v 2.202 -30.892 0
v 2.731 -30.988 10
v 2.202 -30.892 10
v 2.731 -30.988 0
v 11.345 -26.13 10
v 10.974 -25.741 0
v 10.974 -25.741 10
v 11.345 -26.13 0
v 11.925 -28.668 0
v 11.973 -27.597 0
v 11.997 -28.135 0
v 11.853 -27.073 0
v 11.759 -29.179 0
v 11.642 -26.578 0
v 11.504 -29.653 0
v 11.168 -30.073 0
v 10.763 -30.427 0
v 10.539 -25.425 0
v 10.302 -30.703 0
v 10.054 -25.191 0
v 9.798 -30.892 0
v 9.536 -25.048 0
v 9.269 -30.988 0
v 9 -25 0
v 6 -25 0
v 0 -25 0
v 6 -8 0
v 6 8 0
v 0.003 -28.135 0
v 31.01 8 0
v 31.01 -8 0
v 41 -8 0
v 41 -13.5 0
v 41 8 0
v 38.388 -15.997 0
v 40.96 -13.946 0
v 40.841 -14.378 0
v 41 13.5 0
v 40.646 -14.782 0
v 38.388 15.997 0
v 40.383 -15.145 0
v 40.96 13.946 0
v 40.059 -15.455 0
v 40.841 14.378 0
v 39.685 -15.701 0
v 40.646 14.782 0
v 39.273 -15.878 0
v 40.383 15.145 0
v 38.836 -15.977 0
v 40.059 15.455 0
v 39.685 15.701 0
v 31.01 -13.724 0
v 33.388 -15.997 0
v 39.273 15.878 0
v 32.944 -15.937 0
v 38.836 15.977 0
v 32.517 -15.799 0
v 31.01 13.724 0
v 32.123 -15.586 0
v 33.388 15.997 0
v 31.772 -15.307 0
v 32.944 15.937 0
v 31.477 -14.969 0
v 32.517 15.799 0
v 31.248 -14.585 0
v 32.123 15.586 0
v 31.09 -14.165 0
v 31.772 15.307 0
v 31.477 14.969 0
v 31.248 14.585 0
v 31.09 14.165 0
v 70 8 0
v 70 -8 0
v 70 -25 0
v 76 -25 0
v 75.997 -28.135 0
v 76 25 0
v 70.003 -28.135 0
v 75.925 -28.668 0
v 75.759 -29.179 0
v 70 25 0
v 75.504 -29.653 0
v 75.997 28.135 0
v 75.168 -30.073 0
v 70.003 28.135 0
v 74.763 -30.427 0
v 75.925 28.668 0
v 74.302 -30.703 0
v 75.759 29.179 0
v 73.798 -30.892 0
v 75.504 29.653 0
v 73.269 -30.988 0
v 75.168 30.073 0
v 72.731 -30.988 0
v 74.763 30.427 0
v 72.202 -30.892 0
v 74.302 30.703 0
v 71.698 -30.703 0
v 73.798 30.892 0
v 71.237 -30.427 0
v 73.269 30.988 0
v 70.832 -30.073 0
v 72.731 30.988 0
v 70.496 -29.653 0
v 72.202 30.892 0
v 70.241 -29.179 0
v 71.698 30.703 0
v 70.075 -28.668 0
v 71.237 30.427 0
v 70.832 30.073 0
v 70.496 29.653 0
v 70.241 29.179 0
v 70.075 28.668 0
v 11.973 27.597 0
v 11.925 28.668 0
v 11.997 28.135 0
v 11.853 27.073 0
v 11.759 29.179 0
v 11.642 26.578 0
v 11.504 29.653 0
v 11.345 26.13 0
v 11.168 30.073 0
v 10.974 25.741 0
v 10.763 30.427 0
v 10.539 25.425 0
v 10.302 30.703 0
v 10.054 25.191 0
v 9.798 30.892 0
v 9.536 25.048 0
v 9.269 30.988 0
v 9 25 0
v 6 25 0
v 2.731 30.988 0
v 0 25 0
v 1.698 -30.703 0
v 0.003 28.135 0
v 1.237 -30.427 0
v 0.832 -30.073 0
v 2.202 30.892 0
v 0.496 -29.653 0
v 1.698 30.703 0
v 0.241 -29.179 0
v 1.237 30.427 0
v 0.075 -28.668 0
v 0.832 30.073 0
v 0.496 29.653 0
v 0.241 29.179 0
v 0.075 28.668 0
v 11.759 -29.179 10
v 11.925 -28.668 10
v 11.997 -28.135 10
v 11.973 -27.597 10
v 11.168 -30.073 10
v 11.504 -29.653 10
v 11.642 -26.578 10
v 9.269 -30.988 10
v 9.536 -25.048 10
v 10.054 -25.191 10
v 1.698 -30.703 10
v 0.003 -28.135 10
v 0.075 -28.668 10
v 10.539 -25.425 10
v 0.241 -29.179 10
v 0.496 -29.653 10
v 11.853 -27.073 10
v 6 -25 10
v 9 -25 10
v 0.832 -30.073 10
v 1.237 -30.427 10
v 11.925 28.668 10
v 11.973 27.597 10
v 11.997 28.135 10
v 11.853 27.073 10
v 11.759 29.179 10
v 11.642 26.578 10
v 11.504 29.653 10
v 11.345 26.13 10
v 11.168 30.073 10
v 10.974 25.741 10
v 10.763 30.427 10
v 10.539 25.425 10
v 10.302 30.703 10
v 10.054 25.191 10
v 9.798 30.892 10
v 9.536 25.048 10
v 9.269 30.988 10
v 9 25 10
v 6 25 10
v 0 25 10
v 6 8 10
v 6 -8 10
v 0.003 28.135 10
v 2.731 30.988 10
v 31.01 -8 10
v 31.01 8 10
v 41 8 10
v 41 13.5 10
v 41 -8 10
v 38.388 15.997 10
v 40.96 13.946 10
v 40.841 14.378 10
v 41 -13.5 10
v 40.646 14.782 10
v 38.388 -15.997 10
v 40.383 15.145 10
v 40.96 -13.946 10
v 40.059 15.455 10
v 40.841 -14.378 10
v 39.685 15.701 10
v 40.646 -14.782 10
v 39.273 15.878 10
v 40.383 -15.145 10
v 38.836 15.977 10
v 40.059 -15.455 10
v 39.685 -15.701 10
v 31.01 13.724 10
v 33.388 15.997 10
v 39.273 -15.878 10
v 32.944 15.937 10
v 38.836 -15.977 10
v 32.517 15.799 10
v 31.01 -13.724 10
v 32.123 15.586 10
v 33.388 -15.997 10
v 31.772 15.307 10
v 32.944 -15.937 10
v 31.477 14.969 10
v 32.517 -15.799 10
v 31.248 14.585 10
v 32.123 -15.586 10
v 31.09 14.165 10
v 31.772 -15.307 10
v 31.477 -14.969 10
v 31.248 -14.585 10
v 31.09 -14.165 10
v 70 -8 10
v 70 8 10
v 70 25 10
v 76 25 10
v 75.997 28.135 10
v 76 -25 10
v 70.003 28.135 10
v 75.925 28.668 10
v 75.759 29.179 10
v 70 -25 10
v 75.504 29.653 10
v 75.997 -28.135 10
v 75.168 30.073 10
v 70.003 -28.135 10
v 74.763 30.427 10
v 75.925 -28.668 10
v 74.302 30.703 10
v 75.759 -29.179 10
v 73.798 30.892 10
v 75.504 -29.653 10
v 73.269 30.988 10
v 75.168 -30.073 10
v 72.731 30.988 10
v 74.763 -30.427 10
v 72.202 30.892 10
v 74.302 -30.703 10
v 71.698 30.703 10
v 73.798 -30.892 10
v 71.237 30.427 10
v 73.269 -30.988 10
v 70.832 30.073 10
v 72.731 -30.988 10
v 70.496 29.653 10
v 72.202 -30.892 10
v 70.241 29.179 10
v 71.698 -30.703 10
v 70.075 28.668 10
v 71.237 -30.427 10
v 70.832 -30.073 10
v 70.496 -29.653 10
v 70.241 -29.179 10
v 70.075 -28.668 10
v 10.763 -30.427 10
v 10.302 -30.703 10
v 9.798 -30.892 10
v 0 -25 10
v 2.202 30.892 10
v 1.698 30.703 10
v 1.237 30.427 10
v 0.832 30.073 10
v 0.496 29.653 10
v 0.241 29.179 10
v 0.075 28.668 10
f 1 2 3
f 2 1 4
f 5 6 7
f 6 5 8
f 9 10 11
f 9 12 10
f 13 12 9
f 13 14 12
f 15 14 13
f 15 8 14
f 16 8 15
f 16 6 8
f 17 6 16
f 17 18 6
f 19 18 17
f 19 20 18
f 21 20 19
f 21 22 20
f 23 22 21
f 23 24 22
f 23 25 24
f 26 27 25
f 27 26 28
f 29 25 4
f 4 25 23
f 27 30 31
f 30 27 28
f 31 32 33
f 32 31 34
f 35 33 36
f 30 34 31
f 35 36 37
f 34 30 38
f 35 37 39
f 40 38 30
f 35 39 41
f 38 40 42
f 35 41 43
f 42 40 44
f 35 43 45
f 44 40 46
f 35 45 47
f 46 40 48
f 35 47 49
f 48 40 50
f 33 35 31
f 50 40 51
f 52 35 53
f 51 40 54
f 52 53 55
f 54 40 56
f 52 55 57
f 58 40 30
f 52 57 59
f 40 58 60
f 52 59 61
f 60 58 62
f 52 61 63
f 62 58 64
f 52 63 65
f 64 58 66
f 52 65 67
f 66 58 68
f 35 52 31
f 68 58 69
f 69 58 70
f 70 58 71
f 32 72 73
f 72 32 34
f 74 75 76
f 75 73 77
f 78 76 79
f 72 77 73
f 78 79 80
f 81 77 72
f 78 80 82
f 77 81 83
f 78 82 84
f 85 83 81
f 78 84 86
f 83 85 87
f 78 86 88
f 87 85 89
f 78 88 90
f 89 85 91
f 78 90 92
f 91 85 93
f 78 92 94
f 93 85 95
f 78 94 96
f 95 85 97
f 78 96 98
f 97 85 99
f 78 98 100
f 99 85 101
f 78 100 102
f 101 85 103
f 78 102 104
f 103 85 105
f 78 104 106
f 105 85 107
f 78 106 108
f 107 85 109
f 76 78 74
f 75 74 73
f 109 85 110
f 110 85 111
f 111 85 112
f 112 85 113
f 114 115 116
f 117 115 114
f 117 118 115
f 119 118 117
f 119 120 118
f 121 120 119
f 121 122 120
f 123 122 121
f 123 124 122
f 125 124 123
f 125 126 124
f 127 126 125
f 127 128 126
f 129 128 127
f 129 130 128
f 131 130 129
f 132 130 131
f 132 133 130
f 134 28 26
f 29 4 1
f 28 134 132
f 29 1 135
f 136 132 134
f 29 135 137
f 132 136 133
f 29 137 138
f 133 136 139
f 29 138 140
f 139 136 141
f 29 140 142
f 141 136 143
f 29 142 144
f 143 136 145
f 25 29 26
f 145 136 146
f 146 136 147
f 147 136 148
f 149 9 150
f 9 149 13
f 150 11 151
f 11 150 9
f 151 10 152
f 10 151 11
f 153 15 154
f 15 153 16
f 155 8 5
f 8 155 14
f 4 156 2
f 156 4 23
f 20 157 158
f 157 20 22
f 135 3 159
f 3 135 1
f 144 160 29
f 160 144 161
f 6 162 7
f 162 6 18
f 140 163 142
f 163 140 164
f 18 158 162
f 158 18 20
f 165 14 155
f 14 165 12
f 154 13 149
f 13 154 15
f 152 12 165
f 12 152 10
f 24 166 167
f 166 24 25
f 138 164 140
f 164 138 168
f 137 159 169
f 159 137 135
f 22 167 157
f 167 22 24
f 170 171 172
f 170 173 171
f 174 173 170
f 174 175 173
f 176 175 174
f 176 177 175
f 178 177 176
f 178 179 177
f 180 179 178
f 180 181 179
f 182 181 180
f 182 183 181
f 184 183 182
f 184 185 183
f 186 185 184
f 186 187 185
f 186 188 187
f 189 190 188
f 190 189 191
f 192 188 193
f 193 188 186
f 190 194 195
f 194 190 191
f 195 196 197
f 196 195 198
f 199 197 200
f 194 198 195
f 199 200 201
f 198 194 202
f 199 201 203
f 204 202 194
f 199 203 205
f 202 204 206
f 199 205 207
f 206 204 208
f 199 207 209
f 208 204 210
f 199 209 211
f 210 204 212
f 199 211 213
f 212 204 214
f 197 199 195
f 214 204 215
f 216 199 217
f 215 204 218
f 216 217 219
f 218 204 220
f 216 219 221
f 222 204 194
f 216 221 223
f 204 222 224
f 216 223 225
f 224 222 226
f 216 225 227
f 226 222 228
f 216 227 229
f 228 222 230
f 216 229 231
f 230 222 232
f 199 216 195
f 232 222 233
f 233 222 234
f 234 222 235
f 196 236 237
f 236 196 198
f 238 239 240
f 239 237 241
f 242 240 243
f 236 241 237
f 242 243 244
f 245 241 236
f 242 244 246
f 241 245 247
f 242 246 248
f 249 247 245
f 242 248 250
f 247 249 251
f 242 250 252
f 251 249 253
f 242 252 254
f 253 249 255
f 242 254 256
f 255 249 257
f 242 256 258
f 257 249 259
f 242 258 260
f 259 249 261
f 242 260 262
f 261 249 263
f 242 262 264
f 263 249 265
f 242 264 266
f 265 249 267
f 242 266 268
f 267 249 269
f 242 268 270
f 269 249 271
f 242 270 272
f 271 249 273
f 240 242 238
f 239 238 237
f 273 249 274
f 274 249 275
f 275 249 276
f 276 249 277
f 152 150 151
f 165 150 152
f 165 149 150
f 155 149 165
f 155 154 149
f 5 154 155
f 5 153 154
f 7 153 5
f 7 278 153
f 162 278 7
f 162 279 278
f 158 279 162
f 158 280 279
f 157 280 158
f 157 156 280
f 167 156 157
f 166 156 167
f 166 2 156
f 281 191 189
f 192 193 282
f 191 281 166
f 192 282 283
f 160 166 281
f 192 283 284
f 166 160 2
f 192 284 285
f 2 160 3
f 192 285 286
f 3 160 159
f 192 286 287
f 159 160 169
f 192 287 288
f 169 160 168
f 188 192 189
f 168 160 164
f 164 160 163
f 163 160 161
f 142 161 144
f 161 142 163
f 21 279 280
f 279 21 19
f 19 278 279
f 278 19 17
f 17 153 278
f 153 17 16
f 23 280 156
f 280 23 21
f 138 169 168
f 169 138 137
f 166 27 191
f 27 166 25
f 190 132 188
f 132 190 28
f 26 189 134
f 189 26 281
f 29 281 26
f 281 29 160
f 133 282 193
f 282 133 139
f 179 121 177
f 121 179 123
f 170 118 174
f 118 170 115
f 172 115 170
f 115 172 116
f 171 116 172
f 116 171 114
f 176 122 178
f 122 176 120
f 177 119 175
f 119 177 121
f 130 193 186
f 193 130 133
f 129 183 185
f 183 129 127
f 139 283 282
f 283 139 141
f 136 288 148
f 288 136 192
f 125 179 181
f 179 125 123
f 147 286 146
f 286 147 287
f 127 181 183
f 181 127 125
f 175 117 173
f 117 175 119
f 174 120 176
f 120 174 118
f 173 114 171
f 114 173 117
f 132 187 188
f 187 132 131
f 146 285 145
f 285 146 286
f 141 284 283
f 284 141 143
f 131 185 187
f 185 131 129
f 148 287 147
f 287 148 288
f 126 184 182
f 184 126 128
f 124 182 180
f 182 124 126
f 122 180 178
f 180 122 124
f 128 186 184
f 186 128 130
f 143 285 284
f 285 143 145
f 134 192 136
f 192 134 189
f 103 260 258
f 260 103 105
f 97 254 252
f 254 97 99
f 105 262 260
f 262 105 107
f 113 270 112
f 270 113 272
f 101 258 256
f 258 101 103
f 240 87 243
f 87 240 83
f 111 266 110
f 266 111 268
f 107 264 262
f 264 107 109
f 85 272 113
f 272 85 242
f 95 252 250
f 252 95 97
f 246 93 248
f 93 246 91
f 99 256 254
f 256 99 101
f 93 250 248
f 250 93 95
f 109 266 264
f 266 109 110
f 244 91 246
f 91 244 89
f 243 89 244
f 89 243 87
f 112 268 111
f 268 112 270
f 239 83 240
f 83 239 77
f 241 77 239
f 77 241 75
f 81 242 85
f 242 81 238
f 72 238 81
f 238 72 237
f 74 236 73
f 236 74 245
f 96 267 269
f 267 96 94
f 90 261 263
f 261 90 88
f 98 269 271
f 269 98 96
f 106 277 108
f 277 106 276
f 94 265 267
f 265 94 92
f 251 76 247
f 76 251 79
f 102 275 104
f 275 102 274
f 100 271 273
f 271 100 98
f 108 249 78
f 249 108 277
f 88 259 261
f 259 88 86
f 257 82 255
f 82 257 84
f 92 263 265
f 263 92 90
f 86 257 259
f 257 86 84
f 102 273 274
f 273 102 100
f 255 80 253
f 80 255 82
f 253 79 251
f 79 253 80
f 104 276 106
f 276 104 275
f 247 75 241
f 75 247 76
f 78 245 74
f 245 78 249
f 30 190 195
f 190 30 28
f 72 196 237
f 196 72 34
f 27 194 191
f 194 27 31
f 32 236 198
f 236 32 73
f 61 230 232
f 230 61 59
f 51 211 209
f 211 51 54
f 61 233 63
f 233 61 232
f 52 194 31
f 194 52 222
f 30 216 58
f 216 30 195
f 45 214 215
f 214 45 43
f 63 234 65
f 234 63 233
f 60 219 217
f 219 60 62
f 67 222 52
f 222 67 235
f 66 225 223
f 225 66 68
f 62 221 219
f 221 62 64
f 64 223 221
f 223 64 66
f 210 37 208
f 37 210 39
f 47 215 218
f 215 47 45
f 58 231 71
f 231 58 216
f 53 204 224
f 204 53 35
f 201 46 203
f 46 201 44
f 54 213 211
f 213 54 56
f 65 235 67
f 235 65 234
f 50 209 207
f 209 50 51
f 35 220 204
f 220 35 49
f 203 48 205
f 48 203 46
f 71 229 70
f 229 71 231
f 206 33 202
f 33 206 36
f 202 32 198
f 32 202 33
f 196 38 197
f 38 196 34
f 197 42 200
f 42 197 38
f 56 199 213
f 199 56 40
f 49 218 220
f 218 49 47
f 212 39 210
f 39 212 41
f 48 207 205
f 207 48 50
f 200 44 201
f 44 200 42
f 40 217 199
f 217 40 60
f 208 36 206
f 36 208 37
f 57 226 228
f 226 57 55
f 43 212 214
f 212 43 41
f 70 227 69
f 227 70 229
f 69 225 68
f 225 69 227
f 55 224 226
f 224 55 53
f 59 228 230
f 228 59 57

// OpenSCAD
/* == Customizer Settings ================================================ */
/*[Gimbal Settings]*/

// in mm [x,y]
bridge_dimensions = [64,16];

// in mm [x,y], [0,0] if not needed
crosssection_dimensions = [10,32];

// in mm
crosssection_xoffset = -2;

// in mm, outer width (for inner width: add 2x handle_thickness if hooks are used)
handle_a_width = 62;

// in mm, 0 if not needed
handle_a_hooks = 6;

// in mm, outer width (for inner width: add 2x handle_thickness if hooks are used)
handle_b_width = 62;

// in mm, 0 if not needed
handle_b_hooks = 0;

// soft (rounded) hooks?
hooks_soft = true;

// in mm, x/y thickness of the handles
handle_thickness = 6;

// in mm, z thickness of base material
thickness = 10;

// Surface detail level
resolution = 35; //[20:Draft, 35:Normal, 50:Smooth]


/* == Render ============================================================= */
HClamp($fn=resolution);


/* == H-Clamp ============================================================ */
module HClamp() {
    union() {
        // handle a
        translate([handle_thickness+handle_a_hooks,-handle_a_width/2,0])
            rotate([0,0,90])
                UClampOSoft(handle_a_width,handle_a_hooks,handle_thickness,thickness,soft_pins=hooks_soft);
        translate([handle_thickness,0]) {
            // bridge
            translate([0,-bridge_dimensions[1]/2,0])
                cube(lvmult([1,1,thickness],bridge_dimensions));
            // bridge cross-section
            translate(-crosssection_dimensions/2 + [bridge_dimensions[0]/2 + crosssection_xoffset,0])
                SoftCubeLazy(lvmult([1,1,thickness], crosssection_dimensions), 2.5); // check radius
            // handle b
            translate([bridge_dimensions[0]-handle_b_hooks,handle_b_width/2,0])
                rotate([0,0,270])
                    UClampOSoft(handle_b_width,handle_b_hooks,handle_thickness,thickness,soft_pins=hooks_soft);
        }
    }
}

/* U-shaped "clamp" (bracket) based on inner dimensions and thickness
 [w] inner width (space between two pins)
 [h] inner height (pin length)
 [d] clamp diameter
 [dz] clamp z diameter (thtickness)
*/

/* == Fillet ============================================================= */
/* cube with softened (z-axis) edges, lazy version
 size    [x,y,z]
 radius  fillet radius, standard cube if <= 0, limited to x/y dimensions (fully rounded x/y edges)
 expand  fillet, size defines outer dimensions (false, default) or add radius to x/y size (true)
 center  center cube (default: false)
 - based on https://www.thingiverse.com/thing:9347
*/
module SoftCubeLazy(size, radius, expand=false, center=false) {
    if (radius <= 0) { // standard cube, no fillet
        cube(size, center);
    } else {
        x = size[0]; y = size[1]; z = size[2];
        r = min(x/(expand ? 1 : 2), y/(expand ? 1 : 2), radius); // maximum radius (must not exceed x/y dimensions)
        off = r / (expand ? 2 : 1);
        translate (center ? [0,0,-z/2] : [x/2,y/2,0]) {
            linear_extrude(height=z) hull() {
                // place 4 circles in the corners, with the given radius
                translate([-x/2 + off, -y/2 + off, 0]) circle(r);
                translate([ x/2 - off, -y/2 + off, 0]) circle(r);
                translate([-x/2 + off,  y/2 - off, 0]) circle(r);
                translate([ x/2 - off,  y/2 - off, 0]) circle(r);
            }
        }
    }
}
//SoftCubeLazy([20,20,20], 2, $fn=50);
//SoftCubeLazy([40,10,20], 220, center=true, $fn=50);
//SoftCubeLazy([20,10,20], 200, expand=true, center=true, $fn=50);

/* cube with softened (z-axis) edges, strict version
 size    [x,y,z]
 radius  fillet radius, standard cube if <= 0, must be <= 1/2* min(x,y) or <= min(x,y) if expand = true
 expand  fillet, size defines outer dimensions (false, default) or add radius to x/y size (true)
 center  center cube (default: false)
 - based on https://www.thingiverse.com/thing:9347
*/
module SoftCube(size, radius, expand=false, center=false) {
    x = size[0]; y = size[1]; z = size[2];
    assert(radius >= 0, "radius must be >= 0");
    if (expand) {
        assert(radius <= x, "radius must be <= x when expand = true");
        assert(radius <= y, "radius must be <= y when expand = true");
    }  else {
        assert(radius <= x/2, "radius must be <= x/2 when expand = false");
        assert(radius <= y/2, "radius must be <= y/2 when expand = false");
    }    
    if (radius <= 0) { // standard cube, no fillet
        cube(size, center);
    } else {
        off = radius / (expand ? 2 : 1);
        translate (center ? [0,0,-z/2] : [x/2,y/2,0]) {
            linear_extrude(height=z) hull() {
                // place 4 circles in the corners, with the given radius
                translate([-x/2 + off, -y/2 + off, 0]) circle(radius);
                translate([ x/2 - off, -y/2 + off, 0]) circle(radius);
                translate([-x/2 + off,  y/2 - off, 0]) circle(radius);
                translate([ x/2 - off,  y/2 - off, 0]) circle(radius);
            }
        }
    }
}
//SoftCube([20,20,20], 2, $fn=50);
//SoftCube([40,10,20], 5, center=true, $fn=50);
//SoftCube([20,10,20], 10, expand=true, center=true, $fn=50);

/* == Clamp ============================================================== */
/* U-shaped "clamp" (bracket) based on inner dimensions and thickness
 [w] inner width (space between two pins)
 [h] inner height (pin length)
 [d] clamp diameter
 [dz] clamp z diameter
*/
module UClamp(w, h, d, dz) {
    difference() {
        cube([w+2*d,h+d,dz]);
        translate([d,-1,-1]) {
            cube([w,h+1,dz+2]);
        }
    }
}
//UClamp(10,10,10,10);
//UClamp(20,10,15,8);

/* U-shaped "clamp" (bracket) based on inner dimensions and thickness
 [w] inner width (space between two pins)
 [h] inner height (pin length)
 [d] clamp diameter
 [dz] clamp z diameter (thtickness)
 [soft_pins] rounded pins (default: false)
*/
module UClampSoft(w, h, d, dz, soft_pins=false) {
    module UCLeft() {
        union() {
            hull() {
                if (soft_pins) {
                    translate([d/2,d/2,0]) cylinder(d=d, h=dz);
                } else {
                    cube([d,h,dz]);
                }
                translate([d/2,d/2+h,0]) cylinder(d=d, h=dz);
            }
            hull() {
                translate([d,h,0]) cube([w/2,d,dz]);
                translate([d/2,d/2+h,0]) cylinder(d=d, h=dz);
            }
        }
    }
   union() {
       UCLeft();
       translate([w+2*d,0,0]) mirror([1,0,0]) UCLeft();
   }
}
//UClampSoft(20,10,15,8);
//UClampSoft(20,10,15,8, true);

/* U-shaped "clamp" (bracket) based on outer dimensions and thickness
 [w] outer width (space between two pins)
 [h] inner height (pin length)
 [d] clamp diameter
 [dz] clamp z diameter (thtickness)
 [soft_pins] rounded pins (default: false)
*/
module UClampOSoft(w, h, d, dz, soft_pins=false) {
    UClampSoft(w-2*d, h, d, dz, soft_pins);
}
//UClampSoft(20,10,15,8);
//UClampOSoft(50,10,15,8);

/* == Matrix Math ======================================================== */
/* lazy vector multiplication, multiply up to 4 vectors with 2 or 3 dimensions
   v1 is used to identify max dimensions
   if v2 to v4 have more dimensions they are ignored
   if v2 to v4 have less dimensions 1 is assumumed */
function lvmult(v1, v2=[1,1,1], v3=[1,1,1], v4=[1,1,1]) =
    v1[2] == undef
      ? [v1[0]*v2[0]*v3[0]*v4[0],
         v1[1]*v2[1]*v3[1]*v4[1]]
      : [v1[0]*v2[0]*v3[0]*v4[0],
         v1[1]*v2[1]*v3[1]*v4[1],
         v1[2]*(v2[2]==undef?1:v2[2])*(v3[2]==undef?1:v3[2])*(v4[2]==undef?1:v4[2])];
//echo(lvmult([2,3],[3,4]));
//echo(lvmult([10,20,30],[2,3]));
//echo(lvmult([10,20,30],[2,3,4],[10,10,10],[2,2,2]));
//echo(lvmult([2,3],[3,4,1]));

/* lazy vector division, divide up to 4 vectors with 2 or 3 dimensions
   v1 is used to identify the dimensions
   if v2 to v4 have more dimensions they are ignored
   if v2 to v4 have less dimensions 1 is assumumed */
function lvdiv(v1, v2=[1,1,1], v3=[1,1,1], v4=[1,1,1]) =
    v1[2] == undef
      ? [v1[0]/v2[0]/v3[0]/v4[0],
         v1[1]/v2[1]/v3[1]/v4[1]]
      : [v1[0]/v2[0]/v3[0]/v4[0],
         v1[1]/v2[1]/v3[1]/v4[1],
         v1[2]/(v2[2]==undef?1:v2[2])/(v3[2]==undef?1:v3[2])/(v4[2]==undef?1:v4[2])];
//echo(lvdiv([10,20,30],[2,3,4]));
//echo(lvdiv([10,20,30],[2,3,4],[10,10,10],[2,2,2]));
//echo(lvdiv([2,3],[3,4,1]));
